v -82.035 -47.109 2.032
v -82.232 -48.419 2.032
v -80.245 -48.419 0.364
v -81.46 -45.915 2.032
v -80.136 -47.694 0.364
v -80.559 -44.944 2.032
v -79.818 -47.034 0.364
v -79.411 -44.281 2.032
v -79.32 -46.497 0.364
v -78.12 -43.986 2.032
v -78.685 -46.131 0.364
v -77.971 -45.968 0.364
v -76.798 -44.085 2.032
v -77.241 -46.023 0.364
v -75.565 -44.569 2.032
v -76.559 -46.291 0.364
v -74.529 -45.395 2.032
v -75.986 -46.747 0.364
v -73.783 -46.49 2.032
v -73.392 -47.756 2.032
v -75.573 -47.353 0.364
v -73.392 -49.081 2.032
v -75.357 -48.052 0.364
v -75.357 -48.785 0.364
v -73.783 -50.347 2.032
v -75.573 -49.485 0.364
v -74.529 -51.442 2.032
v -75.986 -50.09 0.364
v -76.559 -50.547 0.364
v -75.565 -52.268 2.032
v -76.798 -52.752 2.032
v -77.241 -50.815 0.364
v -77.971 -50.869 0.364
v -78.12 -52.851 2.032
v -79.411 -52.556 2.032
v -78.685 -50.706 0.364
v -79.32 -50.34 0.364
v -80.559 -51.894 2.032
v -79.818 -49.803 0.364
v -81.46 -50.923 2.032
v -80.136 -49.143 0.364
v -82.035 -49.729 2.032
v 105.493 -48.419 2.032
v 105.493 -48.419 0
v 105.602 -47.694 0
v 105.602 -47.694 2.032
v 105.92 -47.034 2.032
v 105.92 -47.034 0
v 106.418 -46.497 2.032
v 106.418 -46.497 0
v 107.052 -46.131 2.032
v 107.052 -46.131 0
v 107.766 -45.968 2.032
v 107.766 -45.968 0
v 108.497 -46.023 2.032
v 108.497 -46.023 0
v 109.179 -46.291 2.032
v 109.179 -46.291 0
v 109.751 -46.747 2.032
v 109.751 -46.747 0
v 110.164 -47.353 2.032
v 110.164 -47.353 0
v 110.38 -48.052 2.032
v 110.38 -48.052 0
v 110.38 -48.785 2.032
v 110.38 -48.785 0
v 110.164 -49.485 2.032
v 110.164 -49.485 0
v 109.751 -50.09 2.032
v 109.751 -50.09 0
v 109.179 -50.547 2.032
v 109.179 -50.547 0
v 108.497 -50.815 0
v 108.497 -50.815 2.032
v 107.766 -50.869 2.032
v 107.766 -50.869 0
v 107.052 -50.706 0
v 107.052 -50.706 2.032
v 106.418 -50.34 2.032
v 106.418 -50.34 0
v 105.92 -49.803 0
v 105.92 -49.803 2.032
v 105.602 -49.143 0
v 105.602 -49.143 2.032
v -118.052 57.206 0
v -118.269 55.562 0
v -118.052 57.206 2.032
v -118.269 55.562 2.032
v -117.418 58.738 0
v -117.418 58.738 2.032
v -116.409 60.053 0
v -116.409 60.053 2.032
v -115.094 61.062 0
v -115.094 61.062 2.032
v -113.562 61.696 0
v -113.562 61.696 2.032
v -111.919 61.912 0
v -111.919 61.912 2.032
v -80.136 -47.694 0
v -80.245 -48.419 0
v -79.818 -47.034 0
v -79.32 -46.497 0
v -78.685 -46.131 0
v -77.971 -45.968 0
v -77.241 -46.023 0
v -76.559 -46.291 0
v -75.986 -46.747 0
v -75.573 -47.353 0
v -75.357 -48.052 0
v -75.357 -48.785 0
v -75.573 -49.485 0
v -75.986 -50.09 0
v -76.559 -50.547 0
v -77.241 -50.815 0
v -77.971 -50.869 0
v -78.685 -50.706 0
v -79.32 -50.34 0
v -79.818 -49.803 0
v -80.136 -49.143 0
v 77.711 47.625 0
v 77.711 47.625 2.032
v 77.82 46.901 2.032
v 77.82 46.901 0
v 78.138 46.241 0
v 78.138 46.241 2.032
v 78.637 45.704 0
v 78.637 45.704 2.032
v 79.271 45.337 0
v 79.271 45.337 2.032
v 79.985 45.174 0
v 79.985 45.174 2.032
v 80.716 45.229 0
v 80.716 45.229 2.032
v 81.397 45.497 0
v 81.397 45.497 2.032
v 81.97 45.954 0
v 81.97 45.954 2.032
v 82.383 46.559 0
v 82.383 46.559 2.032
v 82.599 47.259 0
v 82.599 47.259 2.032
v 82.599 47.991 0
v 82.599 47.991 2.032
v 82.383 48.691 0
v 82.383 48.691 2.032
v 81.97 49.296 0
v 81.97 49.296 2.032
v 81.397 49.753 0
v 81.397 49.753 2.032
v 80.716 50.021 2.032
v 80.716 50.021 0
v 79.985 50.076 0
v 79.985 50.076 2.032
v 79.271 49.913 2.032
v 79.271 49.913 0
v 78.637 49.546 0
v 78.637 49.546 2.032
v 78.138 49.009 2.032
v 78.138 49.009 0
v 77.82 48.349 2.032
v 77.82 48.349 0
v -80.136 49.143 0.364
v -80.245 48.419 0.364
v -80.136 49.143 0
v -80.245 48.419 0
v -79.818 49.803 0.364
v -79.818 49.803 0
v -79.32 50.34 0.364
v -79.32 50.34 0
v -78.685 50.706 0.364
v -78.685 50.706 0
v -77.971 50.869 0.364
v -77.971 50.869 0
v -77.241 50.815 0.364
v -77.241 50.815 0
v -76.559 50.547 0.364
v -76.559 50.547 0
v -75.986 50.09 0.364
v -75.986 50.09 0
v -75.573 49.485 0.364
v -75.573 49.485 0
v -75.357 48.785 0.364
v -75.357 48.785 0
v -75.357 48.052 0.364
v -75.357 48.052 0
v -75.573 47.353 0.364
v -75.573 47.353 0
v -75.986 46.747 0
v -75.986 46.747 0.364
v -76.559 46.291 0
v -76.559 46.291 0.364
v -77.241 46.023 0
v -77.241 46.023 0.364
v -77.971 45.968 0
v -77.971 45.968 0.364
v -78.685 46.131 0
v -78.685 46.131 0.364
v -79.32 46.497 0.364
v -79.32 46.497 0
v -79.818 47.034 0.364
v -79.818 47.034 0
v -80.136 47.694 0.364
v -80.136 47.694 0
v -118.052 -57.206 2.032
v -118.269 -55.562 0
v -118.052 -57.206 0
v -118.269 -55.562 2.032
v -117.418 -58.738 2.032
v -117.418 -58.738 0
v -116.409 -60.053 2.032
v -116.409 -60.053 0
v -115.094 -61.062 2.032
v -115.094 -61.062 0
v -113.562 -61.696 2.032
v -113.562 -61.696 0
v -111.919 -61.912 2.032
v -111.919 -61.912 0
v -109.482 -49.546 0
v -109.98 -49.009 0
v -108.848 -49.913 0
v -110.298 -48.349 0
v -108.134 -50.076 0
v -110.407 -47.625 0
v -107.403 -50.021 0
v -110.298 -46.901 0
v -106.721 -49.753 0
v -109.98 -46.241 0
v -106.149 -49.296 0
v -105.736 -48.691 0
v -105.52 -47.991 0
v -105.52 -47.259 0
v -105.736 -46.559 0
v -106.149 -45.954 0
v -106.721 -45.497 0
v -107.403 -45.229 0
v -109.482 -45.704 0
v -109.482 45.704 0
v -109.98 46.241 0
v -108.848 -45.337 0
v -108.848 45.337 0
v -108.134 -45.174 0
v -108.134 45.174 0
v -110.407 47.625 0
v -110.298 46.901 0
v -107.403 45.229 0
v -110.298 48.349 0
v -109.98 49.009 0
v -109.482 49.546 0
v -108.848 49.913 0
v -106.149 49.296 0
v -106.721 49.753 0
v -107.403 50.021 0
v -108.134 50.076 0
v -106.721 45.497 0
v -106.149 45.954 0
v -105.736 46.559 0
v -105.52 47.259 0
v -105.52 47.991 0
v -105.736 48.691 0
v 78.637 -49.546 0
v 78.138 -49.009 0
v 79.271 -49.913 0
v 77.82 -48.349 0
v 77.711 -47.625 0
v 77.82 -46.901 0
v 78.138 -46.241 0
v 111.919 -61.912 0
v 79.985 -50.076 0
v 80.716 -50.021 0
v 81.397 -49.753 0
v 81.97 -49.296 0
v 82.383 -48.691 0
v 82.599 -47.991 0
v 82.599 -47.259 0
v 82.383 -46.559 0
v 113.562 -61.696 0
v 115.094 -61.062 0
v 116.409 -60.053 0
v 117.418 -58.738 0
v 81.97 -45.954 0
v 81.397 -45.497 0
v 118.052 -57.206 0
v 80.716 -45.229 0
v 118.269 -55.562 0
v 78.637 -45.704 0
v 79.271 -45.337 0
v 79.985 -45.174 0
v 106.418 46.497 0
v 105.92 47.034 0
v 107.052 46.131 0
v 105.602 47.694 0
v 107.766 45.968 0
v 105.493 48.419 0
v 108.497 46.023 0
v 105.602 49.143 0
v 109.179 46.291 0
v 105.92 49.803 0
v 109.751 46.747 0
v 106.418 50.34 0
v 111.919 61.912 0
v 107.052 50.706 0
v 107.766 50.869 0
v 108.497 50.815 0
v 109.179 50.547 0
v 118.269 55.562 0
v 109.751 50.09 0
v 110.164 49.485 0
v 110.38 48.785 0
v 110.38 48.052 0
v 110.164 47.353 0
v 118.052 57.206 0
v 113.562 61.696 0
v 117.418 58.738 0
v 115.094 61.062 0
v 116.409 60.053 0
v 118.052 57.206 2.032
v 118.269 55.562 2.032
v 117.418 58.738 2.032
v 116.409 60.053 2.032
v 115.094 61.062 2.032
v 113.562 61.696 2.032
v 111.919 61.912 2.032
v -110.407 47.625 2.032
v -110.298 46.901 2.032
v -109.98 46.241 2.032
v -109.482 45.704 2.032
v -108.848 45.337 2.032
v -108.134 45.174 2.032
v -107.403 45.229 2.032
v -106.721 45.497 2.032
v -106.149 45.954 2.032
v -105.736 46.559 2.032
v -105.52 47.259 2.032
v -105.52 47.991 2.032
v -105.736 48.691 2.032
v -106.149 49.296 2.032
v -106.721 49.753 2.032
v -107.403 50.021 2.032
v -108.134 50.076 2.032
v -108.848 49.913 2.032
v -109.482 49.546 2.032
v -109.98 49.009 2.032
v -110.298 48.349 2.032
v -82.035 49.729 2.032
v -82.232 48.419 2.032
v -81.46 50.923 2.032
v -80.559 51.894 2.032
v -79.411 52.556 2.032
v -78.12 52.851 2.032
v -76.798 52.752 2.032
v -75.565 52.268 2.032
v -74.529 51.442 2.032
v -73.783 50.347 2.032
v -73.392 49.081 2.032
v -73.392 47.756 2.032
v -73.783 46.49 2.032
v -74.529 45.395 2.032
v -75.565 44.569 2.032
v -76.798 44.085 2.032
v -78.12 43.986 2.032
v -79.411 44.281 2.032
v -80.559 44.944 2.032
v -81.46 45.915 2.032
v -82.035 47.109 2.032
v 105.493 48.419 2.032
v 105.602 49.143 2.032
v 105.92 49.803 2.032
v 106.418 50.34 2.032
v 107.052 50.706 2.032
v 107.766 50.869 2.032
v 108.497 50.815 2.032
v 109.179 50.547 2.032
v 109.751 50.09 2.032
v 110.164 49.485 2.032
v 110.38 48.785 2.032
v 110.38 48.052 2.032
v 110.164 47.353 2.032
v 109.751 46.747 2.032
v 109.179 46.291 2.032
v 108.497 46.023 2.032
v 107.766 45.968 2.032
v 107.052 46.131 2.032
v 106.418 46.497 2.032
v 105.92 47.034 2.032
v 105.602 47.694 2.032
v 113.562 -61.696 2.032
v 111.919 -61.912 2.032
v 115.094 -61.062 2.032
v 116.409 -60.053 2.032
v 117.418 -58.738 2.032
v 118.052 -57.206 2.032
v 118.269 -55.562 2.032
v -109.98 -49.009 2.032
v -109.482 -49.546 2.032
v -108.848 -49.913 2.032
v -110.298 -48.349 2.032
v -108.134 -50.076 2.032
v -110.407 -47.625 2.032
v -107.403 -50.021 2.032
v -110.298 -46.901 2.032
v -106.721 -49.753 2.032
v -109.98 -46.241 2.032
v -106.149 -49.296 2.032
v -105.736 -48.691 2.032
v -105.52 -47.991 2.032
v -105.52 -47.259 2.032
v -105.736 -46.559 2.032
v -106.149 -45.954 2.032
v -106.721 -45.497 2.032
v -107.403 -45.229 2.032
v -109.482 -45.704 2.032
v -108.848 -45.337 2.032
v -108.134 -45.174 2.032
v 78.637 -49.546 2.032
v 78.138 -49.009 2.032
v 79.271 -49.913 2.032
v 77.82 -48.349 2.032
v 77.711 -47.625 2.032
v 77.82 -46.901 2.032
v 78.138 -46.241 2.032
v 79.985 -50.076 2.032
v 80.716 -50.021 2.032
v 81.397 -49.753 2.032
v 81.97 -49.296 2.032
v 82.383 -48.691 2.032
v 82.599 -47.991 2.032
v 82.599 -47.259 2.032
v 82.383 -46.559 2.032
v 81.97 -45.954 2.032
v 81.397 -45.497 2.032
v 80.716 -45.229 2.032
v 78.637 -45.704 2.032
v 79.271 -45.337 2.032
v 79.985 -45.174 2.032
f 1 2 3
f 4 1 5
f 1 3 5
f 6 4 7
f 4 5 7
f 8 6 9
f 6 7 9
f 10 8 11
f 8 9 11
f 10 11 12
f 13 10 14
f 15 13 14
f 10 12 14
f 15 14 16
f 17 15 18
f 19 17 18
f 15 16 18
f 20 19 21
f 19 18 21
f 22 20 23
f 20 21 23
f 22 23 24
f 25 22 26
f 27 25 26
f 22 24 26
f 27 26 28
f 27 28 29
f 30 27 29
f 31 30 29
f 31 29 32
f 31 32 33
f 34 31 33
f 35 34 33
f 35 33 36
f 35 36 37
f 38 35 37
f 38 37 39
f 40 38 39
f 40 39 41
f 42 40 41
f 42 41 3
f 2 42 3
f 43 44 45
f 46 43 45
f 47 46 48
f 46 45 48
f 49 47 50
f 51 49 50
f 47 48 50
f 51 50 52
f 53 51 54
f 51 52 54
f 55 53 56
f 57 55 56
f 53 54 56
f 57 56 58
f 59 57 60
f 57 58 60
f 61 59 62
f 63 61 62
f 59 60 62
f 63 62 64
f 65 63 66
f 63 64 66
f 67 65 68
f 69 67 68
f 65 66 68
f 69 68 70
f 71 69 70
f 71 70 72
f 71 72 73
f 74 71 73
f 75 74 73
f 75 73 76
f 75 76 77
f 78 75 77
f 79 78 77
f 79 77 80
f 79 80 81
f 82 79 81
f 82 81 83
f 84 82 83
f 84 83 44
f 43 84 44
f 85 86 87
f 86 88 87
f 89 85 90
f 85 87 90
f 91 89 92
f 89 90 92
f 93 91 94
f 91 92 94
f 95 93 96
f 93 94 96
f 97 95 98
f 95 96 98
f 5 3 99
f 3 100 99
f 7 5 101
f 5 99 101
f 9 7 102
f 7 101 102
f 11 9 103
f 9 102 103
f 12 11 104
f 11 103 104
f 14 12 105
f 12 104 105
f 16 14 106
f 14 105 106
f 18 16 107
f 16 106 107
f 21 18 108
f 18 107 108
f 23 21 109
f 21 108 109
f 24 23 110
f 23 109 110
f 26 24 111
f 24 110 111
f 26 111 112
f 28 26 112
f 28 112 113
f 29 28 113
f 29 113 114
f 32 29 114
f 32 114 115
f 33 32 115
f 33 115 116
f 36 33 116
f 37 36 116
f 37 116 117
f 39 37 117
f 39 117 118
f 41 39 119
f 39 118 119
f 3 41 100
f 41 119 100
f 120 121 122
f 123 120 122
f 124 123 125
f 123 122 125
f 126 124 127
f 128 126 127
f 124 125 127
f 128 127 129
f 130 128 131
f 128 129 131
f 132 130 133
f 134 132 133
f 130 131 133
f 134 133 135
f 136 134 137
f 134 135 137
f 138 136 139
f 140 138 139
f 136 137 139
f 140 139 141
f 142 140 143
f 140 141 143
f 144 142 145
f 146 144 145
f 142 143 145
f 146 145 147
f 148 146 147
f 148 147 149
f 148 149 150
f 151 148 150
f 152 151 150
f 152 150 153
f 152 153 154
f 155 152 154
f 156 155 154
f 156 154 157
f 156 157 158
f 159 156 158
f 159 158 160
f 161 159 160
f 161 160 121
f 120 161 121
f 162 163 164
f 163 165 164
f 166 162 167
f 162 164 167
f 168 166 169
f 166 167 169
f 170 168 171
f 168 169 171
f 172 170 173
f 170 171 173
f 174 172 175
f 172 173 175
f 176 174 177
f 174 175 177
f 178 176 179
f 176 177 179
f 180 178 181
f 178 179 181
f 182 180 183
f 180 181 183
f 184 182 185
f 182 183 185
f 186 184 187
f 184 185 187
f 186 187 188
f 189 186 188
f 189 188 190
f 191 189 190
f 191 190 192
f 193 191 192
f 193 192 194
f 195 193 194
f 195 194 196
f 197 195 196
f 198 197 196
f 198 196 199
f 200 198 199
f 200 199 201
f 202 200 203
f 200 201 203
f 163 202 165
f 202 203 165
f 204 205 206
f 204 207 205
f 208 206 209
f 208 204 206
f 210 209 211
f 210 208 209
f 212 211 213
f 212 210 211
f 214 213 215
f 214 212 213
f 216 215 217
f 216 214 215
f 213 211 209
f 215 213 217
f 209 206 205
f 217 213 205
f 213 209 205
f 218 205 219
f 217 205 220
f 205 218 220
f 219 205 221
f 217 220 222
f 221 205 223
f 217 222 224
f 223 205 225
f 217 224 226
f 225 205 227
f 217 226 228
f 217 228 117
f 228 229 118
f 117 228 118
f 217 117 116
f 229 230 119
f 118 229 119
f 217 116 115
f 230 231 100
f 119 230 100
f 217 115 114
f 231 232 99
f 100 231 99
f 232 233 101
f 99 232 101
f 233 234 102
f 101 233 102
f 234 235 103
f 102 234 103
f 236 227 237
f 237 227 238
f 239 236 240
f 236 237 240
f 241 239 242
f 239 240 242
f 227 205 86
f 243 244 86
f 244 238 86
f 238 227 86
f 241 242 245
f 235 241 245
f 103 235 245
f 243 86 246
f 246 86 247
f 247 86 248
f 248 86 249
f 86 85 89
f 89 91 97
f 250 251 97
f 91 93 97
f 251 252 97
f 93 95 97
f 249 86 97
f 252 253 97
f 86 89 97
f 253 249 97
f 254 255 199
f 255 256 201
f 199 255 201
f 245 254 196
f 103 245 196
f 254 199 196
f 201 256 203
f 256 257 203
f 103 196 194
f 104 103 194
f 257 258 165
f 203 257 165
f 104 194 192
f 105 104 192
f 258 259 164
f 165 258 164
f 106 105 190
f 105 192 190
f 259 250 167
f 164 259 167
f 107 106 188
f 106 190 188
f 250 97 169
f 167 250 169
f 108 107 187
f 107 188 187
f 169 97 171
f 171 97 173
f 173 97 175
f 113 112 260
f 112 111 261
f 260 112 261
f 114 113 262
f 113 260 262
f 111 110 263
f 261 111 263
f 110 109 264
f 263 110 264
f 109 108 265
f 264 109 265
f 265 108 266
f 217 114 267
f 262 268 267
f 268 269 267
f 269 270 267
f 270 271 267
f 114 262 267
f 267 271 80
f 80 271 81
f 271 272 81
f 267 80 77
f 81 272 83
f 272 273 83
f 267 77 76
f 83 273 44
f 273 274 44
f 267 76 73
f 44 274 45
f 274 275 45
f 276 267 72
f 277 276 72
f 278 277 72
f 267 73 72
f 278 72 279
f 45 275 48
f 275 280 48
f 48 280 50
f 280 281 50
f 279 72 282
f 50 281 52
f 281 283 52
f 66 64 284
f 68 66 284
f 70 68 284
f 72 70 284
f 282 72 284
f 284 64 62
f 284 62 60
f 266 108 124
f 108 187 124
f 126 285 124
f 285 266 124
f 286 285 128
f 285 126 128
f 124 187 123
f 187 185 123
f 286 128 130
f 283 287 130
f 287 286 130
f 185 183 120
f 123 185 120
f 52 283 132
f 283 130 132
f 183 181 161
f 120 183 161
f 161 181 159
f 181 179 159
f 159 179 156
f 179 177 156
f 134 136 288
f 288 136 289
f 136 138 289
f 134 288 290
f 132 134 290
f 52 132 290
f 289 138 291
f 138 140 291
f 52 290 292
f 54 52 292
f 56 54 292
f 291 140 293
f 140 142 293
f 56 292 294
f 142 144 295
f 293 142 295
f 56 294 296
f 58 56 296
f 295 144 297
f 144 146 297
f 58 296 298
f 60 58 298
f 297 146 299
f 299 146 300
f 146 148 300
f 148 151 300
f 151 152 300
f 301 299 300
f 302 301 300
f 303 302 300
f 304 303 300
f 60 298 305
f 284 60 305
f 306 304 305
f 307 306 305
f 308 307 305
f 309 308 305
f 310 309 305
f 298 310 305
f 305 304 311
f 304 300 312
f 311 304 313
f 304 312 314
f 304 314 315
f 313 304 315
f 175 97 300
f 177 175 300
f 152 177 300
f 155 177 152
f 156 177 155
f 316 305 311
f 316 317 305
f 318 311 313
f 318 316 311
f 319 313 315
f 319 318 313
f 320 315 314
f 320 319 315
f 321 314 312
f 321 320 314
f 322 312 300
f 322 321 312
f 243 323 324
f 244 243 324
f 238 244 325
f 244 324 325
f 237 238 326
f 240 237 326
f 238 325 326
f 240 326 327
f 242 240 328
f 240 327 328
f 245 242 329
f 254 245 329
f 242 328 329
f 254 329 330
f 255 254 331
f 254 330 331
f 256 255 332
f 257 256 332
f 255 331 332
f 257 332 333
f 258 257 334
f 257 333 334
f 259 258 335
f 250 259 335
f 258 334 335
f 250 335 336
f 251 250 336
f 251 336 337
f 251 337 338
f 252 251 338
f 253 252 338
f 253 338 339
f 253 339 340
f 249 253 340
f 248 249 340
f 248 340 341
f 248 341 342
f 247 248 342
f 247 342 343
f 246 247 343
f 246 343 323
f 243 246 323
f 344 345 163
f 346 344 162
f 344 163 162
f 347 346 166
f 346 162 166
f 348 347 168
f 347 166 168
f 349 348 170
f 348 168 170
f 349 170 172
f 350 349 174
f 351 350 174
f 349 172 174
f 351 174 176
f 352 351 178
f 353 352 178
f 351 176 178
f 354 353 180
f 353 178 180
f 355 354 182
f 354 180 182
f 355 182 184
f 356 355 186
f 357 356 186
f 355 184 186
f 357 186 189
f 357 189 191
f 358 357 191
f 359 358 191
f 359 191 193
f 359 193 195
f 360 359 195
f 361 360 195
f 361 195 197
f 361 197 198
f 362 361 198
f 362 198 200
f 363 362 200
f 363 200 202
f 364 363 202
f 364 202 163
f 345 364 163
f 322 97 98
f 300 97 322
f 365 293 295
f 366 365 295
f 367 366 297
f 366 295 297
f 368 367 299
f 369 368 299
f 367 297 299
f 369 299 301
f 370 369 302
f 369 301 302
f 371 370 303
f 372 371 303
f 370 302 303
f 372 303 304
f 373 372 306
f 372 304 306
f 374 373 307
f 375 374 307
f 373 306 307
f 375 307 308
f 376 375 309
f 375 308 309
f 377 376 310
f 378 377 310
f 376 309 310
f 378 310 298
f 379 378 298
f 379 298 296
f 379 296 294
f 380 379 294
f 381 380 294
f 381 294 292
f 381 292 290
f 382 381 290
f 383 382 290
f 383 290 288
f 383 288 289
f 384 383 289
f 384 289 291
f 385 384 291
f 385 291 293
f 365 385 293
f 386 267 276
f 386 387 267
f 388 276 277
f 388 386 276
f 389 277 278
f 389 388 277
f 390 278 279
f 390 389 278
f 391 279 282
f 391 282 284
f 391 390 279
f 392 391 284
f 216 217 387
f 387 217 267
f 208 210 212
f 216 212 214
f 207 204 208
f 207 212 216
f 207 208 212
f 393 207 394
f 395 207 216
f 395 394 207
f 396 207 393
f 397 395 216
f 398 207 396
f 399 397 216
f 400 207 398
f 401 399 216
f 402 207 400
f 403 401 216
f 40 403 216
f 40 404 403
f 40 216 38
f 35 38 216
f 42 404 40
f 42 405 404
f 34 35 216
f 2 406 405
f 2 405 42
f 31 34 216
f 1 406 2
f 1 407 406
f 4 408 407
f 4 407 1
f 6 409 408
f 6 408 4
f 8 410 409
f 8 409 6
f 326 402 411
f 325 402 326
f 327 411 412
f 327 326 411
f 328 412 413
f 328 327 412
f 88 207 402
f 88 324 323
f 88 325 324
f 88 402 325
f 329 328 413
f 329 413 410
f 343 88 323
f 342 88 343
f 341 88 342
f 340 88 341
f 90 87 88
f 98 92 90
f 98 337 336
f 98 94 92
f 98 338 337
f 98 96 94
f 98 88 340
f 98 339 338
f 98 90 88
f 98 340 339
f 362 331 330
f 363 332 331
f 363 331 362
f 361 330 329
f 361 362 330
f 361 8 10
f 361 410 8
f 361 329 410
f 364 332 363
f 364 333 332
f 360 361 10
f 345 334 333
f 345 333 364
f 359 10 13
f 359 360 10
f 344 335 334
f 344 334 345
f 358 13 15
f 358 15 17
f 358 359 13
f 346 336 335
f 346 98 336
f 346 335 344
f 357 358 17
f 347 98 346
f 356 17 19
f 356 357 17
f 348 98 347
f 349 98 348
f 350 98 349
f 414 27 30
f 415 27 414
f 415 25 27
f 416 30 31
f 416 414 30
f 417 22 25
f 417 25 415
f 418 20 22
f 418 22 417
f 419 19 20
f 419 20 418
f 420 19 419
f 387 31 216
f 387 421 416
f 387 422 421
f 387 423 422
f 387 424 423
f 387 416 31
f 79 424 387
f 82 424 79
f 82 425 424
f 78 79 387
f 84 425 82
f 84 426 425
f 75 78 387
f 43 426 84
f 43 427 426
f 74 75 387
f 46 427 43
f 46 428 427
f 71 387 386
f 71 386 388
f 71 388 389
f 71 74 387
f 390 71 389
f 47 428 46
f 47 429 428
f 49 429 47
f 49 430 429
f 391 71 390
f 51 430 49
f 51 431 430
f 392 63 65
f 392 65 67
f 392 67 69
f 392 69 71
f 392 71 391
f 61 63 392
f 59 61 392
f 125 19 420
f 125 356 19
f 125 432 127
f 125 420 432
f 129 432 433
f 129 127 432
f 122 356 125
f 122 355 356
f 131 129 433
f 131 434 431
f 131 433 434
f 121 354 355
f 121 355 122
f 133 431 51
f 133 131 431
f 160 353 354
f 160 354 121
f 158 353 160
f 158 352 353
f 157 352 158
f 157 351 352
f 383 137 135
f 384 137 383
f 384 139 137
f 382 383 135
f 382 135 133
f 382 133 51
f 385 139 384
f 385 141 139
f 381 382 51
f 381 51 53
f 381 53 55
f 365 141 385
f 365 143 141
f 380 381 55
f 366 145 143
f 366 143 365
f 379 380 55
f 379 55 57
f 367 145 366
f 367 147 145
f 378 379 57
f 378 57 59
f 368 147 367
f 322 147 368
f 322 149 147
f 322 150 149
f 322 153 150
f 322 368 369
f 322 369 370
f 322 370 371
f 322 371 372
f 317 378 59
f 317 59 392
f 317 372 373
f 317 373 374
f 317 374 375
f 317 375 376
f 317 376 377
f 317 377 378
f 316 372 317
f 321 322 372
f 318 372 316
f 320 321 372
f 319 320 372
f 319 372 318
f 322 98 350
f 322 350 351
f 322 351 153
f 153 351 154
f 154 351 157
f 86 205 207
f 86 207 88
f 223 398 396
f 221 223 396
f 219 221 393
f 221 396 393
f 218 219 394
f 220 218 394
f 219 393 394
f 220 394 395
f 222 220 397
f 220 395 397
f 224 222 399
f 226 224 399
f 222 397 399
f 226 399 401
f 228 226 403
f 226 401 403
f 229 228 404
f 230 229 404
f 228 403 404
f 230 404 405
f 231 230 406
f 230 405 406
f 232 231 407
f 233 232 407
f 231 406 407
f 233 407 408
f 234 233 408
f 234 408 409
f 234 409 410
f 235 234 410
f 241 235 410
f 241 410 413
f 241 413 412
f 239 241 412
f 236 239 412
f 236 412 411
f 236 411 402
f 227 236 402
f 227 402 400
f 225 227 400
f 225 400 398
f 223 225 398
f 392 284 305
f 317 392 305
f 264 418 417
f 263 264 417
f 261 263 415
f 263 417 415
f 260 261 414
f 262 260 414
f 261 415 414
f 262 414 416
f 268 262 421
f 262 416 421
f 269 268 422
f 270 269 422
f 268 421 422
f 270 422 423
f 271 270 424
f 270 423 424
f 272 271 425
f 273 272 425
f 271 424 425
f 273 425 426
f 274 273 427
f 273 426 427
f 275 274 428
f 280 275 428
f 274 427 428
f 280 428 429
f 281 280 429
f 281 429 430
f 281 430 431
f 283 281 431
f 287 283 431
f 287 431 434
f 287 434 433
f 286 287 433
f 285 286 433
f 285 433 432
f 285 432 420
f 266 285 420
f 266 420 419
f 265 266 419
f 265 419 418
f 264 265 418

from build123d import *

# Parameters (mm, degrees)
F0_W           = 236.5375
F0_H           = 123.825
F1_DEPTH       = 2.032
F2_R           = 6.35
F3_D           = 4.9149
F5_D           = 4.9149
F5_CSINK_D     = 8.89
F5_CSINK_ANGLE = 100
F6_D           = 4.9149


with BuildPart() as f1:
    # F0 (on Top) → F1 (new body)
    with BuildSketch(Plane.XY):
        Rectangle(F0_W, F0_H)
    extrude(amount=F1_DEPTH)

    # F2
    f2_edges = [f1.edges().sort_by_distance(p)[0] for p in [
        (118.26875, -61.9125, 1.016),
        (118.26875, 61.9125, 1.016),
        (-118.26875, -61.9125, 1.016),
        (-118.26875, 61.9125, 1.016),
    ]]
    fillet(f2_edges, radius=F2_R)

    # F3 (through all)
    with Locations(Plane(origin=(0, 0, 0), x_dir=(1, 0, 0), z_dir=(0, 0, -1))):
        with Locations((-107.95, -47.625), (-107.95, 47.625), (80.16875, 47.625), (80.16875, -47.625)):
            Hole(F3_D / 2)

    # F5 (through all)
    with Locations(Plane.XY.offset(2.032)):
        with Locations((-77.7875, 48.41875), (-77.7875, -48.41875)):
            CounterSinkHole(F5_D / 2, F5_CSINK_D / 2, counter_sink_angle=F5_CSINK_ANGLE)

    # F6 (through all)
    with Locations(Plane.XY.offset(2.032)):
        with Locations((107.95, 48.41875), (107.95, -48.41875)):
            Hole(F6_D / 2)


solid = f1.part
